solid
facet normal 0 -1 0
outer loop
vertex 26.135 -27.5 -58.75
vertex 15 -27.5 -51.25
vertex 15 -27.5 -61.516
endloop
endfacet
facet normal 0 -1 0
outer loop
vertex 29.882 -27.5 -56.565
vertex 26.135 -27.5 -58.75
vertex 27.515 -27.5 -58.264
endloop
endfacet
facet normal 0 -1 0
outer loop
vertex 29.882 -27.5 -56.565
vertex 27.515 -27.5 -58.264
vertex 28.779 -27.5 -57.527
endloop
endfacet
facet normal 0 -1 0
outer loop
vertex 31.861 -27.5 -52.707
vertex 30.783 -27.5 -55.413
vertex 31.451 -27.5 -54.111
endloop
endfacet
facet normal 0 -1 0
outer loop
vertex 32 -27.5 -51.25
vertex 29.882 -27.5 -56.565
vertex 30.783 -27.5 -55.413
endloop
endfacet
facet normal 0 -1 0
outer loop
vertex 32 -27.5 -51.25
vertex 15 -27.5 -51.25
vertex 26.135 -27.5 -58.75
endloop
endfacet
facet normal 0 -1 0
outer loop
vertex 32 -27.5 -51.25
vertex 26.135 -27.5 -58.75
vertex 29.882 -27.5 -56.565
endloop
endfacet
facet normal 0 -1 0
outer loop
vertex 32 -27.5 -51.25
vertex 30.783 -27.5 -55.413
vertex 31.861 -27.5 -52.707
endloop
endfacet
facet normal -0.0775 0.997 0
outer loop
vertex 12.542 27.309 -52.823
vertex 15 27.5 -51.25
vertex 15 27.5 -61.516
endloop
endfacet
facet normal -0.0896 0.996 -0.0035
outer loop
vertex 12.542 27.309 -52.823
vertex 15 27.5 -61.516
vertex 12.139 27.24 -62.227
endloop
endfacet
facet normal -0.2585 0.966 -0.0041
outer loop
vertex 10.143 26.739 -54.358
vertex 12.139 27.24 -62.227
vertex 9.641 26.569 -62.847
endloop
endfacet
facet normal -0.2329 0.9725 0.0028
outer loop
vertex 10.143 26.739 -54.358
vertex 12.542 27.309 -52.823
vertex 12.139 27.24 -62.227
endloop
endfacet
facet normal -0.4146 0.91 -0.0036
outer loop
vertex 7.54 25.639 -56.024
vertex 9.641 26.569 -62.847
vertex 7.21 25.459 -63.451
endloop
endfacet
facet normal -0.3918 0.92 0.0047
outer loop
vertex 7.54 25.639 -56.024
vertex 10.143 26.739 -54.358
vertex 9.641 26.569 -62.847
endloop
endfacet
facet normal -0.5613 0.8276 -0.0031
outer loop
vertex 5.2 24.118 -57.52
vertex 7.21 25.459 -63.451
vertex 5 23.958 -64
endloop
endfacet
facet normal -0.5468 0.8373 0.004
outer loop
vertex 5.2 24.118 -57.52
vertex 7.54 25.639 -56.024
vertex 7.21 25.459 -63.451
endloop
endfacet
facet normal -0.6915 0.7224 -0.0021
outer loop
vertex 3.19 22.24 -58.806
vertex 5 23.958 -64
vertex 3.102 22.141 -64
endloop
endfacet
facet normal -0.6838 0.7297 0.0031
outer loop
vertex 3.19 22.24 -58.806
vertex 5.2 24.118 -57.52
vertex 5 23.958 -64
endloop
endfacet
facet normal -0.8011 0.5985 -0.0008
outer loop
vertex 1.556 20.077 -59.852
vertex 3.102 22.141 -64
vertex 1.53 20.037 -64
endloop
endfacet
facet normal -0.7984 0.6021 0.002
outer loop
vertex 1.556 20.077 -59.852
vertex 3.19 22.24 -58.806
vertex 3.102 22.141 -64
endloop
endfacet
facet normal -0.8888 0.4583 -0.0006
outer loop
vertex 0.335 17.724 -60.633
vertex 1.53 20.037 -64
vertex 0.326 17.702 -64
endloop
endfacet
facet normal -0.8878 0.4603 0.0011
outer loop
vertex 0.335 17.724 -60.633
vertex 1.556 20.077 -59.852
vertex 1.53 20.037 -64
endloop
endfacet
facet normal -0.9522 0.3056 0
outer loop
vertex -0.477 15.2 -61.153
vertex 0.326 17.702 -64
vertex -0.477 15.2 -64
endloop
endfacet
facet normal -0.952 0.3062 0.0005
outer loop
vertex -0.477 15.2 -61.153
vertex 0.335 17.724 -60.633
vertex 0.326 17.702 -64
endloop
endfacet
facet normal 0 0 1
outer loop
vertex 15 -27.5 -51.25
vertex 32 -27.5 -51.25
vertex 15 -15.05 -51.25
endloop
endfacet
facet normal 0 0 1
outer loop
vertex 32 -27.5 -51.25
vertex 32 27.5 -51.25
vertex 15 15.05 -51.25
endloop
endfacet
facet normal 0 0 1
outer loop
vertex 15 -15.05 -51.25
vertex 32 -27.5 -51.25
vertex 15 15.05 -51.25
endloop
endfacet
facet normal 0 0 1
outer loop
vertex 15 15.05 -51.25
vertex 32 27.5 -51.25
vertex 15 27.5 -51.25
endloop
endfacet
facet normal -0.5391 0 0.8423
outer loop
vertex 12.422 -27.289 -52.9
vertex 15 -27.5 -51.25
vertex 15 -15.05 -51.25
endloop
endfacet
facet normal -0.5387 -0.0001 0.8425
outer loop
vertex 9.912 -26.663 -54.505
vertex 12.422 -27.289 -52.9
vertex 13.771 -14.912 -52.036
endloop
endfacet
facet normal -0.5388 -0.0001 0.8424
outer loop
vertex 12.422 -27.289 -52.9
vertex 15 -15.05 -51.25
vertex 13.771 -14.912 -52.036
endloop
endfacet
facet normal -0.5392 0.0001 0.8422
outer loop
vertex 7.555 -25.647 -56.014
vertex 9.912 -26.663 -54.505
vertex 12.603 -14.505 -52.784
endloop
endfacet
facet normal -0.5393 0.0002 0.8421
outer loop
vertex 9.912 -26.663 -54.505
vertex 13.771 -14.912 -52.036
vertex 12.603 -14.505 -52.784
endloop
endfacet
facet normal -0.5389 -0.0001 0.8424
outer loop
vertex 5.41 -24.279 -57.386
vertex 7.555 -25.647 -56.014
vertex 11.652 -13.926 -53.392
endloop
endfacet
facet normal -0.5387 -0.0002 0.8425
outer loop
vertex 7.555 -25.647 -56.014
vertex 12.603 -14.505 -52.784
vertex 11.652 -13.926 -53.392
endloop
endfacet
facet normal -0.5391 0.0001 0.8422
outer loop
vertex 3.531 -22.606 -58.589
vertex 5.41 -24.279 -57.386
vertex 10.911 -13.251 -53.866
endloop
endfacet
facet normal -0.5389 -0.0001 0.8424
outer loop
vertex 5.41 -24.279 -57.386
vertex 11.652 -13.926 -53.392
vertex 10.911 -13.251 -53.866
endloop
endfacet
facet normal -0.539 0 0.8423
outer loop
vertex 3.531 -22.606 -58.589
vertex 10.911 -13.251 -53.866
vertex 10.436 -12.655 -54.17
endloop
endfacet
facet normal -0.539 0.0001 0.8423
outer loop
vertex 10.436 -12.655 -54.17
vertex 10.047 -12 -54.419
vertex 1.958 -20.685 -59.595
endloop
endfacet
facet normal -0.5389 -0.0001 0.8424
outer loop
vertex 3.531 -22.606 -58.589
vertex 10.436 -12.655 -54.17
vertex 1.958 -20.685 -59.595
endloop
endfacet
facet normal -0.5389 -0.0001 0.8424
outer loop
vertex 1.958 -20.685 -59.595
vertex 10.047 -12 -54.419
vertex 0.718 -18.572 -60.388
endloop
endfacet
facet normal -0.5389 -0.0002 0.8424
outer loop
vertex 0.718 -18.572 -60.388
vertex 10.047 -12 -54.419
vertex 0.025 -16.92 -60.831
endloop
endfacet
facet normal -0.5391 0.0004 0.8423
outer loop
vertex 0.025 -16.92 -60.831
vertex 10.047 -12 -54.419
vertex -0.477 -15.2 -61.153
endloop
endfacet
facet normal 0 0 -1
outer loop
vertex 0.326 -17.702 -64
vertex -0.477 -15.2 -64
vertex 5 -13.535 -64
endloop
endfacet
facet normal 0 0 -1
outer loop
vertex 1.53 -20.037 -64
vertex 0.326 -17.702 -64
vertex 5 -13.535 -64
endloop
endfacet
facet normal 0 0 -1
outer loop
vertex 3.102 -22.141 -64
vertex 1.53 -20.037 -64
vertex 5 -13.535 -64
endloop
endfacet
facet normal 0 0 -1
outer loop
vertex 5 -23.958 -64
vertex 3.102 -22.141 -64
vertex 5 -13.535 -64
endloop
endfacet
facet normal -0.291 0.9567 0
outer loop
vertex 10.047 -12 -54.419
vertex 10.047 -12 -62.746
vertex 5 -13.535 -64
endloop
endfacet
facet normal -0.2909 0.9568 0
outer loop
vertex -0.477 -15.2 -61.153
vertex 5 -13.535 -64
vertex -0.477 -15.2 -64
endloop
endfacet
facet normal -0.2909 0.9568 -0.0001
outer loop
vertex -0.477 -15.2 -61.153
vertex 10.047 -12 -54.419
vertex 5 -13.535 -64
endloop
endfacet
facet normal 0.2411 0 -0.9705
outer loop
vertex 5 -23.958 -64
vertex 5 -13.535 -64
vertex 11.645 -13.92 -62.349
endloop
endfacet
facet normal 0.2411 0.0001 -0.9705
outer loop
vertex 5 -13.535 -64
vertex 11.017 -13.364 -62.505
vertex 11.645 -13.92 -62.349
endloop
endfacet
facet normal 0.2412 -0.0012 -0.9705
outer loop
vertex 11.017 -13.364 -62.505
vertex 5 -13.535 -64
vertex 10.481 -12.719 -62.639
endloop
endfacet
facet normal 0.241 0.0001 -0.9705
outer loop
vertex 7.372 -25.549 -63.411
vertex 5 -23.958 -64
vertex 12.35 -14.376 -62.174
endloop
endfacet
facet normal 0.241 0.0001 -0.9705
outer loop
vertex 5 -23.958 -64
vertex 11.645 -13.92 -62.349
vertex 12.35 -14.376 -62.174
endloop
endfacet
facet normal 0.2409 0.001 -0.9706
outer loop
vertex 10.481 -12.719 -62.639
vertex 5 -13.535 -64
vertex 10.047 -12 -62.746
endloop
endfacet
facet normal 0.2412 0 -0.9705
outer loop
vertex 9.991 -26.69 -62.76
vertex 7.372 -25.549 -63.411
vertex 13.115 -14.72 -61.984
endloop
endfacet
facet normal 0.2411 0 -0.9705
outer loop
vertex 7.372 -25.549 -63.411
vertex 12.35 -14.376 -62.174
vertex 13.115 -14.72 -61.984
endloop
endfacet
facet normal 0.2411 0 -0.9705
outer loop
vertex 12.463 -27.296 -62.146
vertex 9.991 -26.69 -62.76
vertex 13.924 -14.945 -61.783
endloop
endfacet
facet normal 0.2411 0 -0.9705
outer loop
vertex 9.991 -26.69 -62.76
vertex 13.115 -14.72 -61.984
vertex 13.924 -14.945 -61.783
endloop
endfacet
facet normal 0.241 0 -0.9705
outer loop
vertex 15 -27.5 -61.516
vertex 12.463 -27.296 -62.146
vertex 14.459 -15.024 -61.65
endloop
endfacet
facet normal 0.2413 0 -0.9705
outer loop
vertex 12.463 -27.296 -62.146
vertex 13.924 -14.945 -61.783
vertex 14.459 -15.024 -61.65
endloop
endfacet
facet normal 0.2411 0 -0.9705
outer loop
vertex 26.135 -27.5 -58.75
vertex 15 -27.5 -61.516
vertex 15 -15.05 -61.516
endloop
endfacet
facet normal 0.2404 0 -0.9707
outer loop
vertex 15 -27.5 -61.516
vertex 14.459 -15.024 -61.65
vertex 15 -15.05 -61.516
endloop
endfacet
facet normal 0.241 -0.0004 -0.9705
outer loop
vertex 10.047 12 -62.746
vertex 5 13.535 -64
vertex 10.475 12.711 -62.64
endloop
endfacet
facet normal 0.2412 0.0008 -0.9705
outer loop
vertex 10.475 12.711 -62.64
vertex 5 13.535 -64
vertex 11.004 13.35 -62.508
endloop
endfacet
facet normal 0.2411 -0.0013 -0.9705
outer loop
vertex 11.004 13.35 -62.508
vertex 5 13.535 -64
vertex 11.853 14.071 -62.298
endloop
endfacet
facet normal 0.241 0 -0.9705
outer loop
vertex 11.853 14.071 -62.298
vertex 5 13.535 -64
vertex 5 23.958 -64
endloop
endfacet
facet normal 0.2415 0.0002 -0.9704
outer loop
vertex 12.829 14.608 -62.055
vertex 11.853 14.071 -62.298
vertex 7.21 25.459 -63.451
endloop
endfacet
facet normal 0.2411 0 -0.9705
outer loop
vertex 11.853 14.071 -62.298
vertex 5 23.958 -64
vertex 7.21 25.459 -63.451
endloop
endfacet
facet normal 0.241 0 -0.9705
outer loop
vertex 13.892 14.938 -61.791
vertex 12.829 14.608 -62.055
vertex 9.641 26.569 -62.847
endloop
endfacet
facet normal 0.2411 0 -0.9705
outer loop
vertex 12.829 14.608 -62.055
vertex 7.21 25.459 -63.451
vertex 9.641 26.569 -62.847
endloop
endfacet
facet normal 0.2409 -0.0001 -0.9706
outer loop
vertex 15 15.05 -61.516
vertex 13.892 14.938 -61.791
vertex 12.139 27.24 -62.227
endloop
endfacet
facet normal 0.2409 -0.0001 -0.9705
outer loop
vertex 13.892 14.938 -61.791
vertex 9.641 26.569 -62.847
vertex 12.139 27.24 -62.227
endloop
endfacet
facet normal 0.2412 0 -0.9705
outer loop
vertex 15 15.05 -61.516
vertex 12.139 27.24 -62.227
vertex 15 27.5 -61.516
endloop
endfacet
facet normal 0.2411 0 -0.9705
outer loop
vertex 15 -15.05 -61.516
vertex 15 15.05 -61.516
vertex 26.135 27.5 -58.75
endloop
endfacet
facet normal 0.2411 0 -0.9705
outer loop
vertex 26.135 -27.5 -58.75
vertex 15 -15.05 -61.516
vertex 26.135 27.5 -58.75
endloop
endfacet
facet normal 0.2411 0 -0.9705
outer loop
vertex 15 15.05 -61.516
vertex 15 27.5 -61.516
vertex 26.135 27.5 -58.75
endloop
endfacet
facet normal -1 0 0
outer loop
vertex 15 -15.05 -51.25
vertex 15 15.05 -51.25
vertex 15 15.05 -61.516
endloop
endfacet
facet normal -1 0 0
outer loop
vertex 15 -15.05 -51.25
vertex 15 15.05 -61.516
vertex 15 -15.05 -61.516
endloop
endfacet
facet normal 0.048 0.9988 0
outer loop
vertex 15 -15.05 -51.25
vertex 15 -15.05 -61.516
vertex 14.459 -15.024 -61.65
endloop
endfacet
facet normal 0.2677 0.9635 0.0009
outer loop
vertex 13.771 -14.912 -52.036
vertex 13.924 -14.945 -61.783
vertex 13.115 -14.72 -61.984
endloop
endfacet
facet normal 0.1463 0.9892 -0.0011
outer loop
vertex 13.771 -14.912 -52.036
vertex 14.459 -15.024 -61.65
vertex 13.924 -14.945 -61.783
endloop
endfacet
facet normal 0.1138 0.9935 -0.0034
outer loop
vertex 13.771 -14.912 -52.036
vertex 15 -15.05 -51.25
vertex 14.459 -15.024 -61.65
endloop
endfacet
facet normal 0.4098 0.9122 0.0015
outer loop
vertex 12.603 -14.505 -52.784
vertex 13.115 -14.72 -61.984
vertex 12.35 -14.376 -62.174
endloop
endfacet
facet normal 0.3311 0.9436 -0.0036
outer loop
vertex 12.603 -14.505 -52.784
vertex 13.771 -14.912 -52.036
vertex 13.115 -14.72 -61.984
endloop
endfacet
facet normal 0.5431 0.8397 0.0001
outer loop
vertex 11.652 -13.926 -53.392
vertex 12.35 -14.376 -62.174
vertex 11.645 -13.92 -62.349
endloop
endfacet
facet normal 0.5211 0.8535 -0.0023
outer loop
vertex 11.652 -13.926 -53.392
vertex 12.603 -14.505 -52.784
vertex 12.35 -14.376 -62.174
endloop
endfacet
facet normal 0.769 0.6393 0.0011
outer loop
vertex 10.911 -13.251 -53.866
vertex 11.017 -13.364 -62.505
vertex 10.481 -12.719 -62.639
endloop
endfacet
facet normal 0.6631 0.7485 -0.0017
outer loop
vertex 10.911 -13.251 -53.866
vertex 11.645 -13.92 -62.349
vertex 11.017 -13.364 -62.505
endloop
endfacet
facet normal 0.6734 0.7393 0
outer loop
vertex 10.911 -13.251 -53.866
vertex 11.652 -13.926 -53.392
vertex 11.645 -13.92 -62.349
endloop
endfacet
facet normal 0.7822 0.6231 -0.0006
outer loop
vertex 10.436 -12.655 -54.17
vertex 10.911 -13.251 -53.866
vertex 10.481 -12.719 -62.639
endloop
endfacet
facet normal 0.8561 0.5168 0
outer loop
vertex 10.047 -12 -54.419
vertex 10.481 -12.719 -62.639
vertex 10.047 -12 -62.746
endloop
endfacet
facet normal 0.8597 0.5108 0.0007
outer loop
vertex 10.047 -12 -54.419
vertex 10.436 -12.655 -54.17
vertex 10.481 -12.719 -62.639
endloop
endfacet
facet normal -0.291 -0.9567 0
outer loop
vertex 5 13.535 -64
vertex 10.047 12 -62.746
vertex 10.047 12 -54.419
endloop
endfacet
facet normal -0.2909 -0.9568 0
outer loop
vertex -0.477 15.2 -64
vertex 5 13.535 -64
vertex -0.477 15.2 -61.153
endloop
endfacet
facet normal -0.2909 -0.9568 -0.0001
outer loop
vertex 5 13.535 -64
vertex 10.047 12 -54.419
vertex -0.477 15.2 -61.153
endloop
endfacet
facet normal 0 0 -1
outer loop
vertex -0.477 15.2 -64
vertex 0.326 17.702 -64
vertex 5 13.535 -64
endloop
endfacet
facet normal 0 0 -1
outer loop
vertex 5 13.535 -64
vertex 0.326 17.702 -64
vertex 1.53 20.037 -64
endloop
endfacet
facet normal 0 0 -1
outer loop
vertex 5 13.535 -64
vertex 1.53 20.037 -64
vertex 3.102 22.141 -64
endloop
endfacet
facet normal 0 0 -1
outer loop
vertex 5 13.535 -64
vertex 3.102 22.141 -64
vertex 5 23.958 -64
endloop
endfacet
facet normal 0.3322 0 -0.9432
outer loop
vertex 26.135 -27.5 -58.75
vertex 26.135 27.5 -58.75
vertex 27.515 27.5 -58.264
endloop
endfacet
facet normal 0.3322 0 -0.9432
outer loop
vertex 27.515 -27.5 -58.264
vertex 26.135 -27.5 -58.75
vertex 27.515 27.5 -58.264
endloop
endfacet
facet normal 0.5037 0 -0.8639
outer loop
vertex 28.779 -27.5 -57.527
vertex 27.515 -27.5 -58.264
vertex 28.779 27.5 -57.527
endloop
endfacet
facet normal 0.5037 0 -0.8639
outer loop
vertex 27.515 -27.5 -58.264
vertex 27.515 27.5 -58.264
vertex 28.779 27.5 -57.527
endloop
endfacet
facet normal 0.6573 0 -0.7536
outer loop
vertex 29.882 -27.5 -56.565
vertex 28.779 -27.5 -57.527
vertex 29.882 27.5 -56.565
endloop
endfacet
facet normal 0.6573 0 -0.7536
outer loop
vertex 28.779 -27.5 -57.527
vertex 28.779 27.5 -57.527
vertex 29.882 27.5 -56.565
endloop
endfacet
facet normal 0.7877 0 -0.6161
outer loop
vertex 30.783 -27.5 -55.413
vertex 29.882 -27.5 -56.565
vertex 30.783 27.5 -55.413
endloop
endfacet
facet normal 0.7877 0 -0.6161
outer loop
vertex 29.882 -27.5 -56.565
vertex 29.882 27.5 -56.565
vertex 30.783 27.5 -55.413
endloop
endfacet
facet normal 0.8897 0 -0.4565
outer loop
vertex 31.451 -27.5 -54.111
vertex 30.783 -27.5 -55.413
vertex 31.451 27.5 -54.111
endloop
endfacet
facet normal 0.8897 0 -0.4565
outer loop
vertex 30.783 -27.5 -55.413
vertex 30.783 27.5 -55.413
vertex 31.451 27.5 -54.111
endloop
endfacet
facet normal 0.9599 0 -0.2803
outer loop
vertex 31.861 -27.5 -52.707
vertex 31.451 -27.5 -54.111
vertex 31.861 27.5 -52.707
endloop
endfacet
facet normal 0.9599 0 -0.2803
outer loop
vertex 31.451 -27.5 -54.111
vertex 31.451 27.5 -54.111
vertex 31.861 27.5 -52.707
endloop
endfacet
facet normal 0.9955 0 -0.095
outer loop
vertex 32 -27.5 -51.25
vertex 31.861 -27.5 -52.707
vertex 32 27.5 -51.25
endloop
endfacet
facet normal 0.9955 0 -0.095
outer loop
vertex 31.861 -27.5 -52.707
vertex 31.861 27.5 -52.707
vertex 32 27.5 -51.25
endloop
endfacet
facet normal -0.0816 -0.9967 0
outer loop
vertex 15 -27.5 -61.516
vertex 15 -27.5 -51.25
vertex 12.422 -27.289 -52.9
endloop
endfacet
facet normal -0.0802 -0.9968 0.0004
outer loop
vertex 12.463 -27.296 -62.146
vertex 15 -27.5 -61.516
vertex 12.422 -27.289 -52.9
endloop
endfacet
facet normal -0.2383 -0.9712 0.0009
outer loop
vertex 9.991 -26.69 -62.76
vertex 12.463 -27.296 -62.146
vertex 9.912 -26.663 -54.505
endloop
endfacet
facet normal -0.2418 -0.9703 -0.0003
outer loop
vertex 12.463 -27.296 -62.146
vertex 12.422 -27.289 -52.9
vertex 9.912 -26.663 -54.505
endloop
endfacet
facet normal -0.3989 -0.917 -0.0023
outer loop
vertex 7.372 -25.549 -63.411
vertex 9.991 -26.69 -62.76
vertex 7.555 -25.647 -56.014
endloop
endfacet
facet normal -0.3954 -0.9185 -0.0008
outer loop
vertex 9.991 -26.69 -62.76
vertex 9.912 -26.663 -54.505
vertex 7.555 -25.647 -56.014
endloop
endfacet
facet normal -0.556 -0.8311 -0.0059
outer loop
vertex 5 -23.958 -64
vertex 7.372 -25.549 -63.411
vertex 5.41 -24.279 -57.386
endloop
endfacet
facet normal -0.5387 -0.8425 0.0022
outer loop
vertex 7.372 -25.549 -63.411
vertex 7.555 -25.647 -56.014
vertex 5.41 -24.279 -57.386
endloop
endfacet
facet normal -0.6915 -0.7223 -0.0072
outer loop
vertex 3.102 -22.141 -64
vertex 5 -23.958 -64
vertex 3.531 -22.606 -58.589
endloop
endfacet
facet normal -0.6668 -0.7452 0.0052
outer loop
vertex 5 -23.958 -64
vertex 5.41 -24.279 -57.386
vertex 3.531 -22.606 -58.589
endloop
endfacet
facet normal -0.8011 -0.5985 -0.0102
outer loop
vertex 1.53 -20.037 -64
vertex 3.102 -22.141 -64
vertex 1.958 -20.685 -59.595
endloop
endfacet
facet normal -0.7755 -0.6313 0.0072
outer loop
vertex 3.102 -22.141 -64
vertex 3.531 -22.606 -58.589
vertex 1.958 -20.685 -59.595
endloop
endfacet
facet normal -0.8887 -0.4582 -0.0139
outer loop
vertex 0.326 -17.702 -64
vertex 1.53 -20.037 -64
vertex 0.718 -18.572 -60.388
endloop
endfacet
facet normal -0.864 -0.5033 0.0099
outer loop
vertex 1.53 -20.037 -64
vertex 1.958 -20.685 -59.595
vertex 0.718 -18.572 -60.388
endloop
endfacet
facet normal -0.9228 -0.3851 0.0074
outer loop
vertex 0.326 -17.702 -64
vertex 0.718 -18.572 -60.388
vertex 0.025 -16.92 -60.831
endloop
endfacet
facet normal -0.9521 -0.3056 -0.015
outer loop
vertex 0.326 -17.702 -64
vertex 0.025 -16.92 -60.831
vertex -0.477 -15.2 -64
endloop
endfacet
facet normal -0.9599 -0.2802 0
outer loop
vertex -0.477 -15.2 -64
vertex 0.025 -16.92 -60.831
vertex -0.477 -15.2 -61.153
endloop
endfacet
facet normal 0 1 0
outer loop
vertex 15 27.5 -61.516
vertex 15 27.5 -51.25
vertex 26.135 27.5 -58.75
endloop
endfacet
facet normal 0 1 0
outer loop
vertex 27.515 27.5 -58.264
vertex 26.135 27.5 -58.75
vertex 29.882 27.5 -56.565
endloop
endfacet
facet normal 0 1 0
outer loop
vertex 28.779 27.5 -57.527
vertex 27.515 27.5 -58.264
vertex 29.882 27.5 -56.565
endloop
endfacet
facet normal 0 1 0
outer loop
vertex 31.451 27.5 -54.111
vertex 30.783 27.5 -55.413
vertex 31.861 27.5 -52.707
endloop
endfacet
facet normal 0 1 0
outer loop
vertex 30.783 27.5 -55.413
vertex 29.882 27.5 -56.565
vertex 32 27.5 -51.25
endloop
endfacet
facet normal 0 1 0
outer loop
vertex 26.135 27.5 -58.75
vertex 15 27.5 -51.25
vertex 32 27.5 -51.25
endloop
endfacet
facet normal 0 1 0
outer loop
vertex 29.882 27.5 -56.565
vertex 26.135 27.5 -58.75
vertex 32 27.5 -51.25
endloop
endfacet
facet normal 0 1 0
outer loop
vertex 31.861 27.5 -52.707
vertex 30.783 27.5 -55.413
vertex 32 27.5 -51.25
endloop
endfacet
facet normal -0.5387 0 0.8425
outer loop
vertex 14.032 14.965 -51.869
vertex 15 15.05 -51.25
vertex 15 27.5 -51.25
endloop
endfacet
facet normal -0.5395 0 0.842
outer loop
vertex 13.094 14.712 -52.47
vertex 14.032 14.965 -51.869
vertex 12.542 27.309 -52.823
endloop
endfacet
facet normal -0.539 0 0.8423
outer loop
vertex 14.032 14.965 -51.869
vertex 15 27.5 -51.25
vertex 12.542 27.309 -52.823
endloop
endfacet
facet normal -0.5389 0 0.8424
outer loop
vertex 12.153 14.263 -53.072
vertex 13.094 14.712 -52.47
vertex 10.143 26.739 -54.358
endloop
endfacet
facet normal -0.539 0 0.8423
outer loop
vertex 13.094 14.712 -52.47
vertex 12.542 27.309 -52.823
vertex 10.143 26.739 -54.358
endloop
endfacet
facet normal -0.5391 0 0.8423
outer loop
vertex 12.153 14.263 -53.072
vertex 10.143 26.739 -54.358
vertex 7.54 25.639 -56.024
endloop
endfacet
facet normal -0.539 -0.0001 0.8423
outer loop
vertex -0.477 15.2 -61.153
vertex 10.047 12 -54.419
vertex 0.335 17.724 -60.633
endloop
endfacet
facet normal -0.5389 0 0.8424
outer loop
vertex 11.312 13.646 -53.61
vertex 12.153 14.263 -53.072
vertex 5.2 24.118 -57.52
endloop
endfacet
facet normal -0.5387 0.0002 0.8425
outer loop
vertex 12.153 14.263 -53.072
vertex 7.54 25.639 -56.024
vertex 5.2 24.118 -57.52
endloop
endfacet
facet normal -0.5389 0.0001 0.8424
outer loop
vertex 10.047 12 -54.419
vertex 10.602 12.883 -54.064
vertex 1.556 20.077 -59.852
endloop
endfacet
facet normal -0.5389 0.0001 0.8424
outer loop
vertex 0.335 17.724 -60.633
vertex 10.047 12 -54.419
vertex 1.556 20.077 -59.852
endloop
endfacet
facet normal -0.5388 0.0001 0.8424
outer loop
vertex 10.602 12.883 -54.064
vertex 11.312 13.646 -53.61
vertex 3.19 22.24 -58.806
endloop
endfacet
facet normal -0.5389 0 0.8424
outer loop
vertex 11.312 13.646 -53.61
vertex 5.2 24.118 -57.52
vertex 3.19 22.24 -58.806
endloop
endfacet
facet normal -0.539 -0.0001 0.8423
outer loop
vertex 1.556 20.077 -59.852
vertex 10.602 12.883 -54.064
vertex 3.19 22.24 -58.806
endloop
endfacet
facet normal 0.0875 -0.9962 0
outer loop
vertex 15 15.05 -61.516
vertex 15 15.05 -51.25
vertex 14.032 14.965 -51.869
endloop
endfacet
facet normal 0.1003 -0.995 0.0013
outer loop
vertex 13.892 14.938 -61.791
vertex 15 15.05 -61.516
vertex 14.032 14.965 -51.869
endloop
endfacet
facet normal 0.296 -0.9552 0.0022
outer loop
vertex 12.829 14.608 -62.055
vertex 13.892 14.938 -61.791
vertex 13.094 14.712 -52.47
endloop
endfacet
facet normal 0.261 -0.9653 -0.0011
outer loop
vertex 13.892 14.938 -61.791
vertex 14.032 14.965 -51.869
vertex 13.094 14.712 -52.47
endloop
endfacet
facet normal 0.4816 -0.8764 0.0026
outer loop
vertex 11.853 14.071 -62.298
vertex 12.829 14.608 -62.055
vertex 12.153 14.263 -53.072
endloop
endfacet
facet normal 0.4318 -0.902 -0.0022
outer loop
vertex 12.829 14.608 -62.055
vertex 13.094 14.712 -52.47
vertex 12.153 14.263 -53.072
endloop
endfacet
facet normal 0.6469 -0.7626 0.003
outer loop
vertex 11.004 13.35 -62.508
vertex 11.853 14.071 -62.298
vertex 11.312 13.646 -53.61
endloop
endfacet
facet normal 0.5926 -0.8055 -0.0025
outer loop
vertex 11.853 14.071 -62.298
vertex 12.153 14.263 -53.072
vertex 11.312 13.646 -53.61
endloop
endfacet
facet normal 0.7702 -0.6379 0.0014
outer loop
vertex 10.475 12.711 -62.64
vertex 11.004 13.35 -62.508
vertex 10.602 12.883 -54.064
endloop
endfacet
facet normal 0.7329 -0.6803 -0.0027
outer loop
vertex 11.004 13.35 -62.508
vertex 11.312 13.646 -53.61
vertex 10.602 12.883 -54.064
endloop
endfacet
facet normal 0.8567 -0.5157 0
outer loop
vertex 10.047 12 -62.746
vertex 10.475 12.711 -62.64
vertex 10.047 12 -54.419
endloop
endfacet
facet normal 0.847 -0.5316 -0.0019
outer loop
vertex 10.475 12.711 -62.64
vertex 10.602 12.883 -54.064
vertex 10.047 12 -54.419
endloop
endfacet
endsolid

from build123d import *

# Parameters (mm, degrees)
PAD046_DEPTH    = 55
POCKET064_DEPTH = 147.675197


with BuildPart() as part:
    # Sketch126 → Pad046 (new body)
    with BuildSketch(Plane.XZ.offset(-27.5)):
        with BuildLine():
            ThreePointArc((-5.864892, -58.75), (-1.6403, -56.01044), (0, -51.25))
            Line((0, -51.25), (-17, -51.25))
            Line((-17, -51.25), (-36.926579, -64))
            Line((-36.926579, -64), (-27, -64))
            Line((-27, -64), (-5.864892, -58.75))
        make_face()
    extrude(amount=PAD046_DEPTH)

    # Sketch127 (on Face3 of Pad046) → Pocket064 (cut, through all)
    with BuildSketch(Plane(origin=(0, 0, -51.25), x_dir=(0, -1, 0), z_dir=(0, 0, 1))):
        with BuildLine():
            Line((-27.5, -17), (-27.5, -43))
            Line((-27.5, -43), (0, -43))
            Line((0, -43), (0, -17))
            Line((0, -17), (-15.050161, -17))
            ThreePointArc((-15.050161, -17), (-14.226455, -19.908295), (-12, -21.952695))
            Line((-12, -21.952695), (-15.2, -32.476953))
            ThreePointArc((-27.5, -17), (-24.05052, -26.884661), (-15.2, -32.476953))
        make_face()
    pocket064 = extrude(amount=-POCKET064_DEPTH, mode=Mode.SUBTRACT)

    # Mirrored003: Pocket064 across Sketch127 V_Axis
    add(pocket064.mirror(Plane(origin=(0, 0, -51.25), x_dir=(0, 0, 1), z_dir=(0, -1, 0))), mode=Mode.SUBTRACT)


with BuildPart() as part_1:
    # Body017 placement: moved
    add(part.part.moved(Location((32, 0, 0))))


solid = part_1.part
